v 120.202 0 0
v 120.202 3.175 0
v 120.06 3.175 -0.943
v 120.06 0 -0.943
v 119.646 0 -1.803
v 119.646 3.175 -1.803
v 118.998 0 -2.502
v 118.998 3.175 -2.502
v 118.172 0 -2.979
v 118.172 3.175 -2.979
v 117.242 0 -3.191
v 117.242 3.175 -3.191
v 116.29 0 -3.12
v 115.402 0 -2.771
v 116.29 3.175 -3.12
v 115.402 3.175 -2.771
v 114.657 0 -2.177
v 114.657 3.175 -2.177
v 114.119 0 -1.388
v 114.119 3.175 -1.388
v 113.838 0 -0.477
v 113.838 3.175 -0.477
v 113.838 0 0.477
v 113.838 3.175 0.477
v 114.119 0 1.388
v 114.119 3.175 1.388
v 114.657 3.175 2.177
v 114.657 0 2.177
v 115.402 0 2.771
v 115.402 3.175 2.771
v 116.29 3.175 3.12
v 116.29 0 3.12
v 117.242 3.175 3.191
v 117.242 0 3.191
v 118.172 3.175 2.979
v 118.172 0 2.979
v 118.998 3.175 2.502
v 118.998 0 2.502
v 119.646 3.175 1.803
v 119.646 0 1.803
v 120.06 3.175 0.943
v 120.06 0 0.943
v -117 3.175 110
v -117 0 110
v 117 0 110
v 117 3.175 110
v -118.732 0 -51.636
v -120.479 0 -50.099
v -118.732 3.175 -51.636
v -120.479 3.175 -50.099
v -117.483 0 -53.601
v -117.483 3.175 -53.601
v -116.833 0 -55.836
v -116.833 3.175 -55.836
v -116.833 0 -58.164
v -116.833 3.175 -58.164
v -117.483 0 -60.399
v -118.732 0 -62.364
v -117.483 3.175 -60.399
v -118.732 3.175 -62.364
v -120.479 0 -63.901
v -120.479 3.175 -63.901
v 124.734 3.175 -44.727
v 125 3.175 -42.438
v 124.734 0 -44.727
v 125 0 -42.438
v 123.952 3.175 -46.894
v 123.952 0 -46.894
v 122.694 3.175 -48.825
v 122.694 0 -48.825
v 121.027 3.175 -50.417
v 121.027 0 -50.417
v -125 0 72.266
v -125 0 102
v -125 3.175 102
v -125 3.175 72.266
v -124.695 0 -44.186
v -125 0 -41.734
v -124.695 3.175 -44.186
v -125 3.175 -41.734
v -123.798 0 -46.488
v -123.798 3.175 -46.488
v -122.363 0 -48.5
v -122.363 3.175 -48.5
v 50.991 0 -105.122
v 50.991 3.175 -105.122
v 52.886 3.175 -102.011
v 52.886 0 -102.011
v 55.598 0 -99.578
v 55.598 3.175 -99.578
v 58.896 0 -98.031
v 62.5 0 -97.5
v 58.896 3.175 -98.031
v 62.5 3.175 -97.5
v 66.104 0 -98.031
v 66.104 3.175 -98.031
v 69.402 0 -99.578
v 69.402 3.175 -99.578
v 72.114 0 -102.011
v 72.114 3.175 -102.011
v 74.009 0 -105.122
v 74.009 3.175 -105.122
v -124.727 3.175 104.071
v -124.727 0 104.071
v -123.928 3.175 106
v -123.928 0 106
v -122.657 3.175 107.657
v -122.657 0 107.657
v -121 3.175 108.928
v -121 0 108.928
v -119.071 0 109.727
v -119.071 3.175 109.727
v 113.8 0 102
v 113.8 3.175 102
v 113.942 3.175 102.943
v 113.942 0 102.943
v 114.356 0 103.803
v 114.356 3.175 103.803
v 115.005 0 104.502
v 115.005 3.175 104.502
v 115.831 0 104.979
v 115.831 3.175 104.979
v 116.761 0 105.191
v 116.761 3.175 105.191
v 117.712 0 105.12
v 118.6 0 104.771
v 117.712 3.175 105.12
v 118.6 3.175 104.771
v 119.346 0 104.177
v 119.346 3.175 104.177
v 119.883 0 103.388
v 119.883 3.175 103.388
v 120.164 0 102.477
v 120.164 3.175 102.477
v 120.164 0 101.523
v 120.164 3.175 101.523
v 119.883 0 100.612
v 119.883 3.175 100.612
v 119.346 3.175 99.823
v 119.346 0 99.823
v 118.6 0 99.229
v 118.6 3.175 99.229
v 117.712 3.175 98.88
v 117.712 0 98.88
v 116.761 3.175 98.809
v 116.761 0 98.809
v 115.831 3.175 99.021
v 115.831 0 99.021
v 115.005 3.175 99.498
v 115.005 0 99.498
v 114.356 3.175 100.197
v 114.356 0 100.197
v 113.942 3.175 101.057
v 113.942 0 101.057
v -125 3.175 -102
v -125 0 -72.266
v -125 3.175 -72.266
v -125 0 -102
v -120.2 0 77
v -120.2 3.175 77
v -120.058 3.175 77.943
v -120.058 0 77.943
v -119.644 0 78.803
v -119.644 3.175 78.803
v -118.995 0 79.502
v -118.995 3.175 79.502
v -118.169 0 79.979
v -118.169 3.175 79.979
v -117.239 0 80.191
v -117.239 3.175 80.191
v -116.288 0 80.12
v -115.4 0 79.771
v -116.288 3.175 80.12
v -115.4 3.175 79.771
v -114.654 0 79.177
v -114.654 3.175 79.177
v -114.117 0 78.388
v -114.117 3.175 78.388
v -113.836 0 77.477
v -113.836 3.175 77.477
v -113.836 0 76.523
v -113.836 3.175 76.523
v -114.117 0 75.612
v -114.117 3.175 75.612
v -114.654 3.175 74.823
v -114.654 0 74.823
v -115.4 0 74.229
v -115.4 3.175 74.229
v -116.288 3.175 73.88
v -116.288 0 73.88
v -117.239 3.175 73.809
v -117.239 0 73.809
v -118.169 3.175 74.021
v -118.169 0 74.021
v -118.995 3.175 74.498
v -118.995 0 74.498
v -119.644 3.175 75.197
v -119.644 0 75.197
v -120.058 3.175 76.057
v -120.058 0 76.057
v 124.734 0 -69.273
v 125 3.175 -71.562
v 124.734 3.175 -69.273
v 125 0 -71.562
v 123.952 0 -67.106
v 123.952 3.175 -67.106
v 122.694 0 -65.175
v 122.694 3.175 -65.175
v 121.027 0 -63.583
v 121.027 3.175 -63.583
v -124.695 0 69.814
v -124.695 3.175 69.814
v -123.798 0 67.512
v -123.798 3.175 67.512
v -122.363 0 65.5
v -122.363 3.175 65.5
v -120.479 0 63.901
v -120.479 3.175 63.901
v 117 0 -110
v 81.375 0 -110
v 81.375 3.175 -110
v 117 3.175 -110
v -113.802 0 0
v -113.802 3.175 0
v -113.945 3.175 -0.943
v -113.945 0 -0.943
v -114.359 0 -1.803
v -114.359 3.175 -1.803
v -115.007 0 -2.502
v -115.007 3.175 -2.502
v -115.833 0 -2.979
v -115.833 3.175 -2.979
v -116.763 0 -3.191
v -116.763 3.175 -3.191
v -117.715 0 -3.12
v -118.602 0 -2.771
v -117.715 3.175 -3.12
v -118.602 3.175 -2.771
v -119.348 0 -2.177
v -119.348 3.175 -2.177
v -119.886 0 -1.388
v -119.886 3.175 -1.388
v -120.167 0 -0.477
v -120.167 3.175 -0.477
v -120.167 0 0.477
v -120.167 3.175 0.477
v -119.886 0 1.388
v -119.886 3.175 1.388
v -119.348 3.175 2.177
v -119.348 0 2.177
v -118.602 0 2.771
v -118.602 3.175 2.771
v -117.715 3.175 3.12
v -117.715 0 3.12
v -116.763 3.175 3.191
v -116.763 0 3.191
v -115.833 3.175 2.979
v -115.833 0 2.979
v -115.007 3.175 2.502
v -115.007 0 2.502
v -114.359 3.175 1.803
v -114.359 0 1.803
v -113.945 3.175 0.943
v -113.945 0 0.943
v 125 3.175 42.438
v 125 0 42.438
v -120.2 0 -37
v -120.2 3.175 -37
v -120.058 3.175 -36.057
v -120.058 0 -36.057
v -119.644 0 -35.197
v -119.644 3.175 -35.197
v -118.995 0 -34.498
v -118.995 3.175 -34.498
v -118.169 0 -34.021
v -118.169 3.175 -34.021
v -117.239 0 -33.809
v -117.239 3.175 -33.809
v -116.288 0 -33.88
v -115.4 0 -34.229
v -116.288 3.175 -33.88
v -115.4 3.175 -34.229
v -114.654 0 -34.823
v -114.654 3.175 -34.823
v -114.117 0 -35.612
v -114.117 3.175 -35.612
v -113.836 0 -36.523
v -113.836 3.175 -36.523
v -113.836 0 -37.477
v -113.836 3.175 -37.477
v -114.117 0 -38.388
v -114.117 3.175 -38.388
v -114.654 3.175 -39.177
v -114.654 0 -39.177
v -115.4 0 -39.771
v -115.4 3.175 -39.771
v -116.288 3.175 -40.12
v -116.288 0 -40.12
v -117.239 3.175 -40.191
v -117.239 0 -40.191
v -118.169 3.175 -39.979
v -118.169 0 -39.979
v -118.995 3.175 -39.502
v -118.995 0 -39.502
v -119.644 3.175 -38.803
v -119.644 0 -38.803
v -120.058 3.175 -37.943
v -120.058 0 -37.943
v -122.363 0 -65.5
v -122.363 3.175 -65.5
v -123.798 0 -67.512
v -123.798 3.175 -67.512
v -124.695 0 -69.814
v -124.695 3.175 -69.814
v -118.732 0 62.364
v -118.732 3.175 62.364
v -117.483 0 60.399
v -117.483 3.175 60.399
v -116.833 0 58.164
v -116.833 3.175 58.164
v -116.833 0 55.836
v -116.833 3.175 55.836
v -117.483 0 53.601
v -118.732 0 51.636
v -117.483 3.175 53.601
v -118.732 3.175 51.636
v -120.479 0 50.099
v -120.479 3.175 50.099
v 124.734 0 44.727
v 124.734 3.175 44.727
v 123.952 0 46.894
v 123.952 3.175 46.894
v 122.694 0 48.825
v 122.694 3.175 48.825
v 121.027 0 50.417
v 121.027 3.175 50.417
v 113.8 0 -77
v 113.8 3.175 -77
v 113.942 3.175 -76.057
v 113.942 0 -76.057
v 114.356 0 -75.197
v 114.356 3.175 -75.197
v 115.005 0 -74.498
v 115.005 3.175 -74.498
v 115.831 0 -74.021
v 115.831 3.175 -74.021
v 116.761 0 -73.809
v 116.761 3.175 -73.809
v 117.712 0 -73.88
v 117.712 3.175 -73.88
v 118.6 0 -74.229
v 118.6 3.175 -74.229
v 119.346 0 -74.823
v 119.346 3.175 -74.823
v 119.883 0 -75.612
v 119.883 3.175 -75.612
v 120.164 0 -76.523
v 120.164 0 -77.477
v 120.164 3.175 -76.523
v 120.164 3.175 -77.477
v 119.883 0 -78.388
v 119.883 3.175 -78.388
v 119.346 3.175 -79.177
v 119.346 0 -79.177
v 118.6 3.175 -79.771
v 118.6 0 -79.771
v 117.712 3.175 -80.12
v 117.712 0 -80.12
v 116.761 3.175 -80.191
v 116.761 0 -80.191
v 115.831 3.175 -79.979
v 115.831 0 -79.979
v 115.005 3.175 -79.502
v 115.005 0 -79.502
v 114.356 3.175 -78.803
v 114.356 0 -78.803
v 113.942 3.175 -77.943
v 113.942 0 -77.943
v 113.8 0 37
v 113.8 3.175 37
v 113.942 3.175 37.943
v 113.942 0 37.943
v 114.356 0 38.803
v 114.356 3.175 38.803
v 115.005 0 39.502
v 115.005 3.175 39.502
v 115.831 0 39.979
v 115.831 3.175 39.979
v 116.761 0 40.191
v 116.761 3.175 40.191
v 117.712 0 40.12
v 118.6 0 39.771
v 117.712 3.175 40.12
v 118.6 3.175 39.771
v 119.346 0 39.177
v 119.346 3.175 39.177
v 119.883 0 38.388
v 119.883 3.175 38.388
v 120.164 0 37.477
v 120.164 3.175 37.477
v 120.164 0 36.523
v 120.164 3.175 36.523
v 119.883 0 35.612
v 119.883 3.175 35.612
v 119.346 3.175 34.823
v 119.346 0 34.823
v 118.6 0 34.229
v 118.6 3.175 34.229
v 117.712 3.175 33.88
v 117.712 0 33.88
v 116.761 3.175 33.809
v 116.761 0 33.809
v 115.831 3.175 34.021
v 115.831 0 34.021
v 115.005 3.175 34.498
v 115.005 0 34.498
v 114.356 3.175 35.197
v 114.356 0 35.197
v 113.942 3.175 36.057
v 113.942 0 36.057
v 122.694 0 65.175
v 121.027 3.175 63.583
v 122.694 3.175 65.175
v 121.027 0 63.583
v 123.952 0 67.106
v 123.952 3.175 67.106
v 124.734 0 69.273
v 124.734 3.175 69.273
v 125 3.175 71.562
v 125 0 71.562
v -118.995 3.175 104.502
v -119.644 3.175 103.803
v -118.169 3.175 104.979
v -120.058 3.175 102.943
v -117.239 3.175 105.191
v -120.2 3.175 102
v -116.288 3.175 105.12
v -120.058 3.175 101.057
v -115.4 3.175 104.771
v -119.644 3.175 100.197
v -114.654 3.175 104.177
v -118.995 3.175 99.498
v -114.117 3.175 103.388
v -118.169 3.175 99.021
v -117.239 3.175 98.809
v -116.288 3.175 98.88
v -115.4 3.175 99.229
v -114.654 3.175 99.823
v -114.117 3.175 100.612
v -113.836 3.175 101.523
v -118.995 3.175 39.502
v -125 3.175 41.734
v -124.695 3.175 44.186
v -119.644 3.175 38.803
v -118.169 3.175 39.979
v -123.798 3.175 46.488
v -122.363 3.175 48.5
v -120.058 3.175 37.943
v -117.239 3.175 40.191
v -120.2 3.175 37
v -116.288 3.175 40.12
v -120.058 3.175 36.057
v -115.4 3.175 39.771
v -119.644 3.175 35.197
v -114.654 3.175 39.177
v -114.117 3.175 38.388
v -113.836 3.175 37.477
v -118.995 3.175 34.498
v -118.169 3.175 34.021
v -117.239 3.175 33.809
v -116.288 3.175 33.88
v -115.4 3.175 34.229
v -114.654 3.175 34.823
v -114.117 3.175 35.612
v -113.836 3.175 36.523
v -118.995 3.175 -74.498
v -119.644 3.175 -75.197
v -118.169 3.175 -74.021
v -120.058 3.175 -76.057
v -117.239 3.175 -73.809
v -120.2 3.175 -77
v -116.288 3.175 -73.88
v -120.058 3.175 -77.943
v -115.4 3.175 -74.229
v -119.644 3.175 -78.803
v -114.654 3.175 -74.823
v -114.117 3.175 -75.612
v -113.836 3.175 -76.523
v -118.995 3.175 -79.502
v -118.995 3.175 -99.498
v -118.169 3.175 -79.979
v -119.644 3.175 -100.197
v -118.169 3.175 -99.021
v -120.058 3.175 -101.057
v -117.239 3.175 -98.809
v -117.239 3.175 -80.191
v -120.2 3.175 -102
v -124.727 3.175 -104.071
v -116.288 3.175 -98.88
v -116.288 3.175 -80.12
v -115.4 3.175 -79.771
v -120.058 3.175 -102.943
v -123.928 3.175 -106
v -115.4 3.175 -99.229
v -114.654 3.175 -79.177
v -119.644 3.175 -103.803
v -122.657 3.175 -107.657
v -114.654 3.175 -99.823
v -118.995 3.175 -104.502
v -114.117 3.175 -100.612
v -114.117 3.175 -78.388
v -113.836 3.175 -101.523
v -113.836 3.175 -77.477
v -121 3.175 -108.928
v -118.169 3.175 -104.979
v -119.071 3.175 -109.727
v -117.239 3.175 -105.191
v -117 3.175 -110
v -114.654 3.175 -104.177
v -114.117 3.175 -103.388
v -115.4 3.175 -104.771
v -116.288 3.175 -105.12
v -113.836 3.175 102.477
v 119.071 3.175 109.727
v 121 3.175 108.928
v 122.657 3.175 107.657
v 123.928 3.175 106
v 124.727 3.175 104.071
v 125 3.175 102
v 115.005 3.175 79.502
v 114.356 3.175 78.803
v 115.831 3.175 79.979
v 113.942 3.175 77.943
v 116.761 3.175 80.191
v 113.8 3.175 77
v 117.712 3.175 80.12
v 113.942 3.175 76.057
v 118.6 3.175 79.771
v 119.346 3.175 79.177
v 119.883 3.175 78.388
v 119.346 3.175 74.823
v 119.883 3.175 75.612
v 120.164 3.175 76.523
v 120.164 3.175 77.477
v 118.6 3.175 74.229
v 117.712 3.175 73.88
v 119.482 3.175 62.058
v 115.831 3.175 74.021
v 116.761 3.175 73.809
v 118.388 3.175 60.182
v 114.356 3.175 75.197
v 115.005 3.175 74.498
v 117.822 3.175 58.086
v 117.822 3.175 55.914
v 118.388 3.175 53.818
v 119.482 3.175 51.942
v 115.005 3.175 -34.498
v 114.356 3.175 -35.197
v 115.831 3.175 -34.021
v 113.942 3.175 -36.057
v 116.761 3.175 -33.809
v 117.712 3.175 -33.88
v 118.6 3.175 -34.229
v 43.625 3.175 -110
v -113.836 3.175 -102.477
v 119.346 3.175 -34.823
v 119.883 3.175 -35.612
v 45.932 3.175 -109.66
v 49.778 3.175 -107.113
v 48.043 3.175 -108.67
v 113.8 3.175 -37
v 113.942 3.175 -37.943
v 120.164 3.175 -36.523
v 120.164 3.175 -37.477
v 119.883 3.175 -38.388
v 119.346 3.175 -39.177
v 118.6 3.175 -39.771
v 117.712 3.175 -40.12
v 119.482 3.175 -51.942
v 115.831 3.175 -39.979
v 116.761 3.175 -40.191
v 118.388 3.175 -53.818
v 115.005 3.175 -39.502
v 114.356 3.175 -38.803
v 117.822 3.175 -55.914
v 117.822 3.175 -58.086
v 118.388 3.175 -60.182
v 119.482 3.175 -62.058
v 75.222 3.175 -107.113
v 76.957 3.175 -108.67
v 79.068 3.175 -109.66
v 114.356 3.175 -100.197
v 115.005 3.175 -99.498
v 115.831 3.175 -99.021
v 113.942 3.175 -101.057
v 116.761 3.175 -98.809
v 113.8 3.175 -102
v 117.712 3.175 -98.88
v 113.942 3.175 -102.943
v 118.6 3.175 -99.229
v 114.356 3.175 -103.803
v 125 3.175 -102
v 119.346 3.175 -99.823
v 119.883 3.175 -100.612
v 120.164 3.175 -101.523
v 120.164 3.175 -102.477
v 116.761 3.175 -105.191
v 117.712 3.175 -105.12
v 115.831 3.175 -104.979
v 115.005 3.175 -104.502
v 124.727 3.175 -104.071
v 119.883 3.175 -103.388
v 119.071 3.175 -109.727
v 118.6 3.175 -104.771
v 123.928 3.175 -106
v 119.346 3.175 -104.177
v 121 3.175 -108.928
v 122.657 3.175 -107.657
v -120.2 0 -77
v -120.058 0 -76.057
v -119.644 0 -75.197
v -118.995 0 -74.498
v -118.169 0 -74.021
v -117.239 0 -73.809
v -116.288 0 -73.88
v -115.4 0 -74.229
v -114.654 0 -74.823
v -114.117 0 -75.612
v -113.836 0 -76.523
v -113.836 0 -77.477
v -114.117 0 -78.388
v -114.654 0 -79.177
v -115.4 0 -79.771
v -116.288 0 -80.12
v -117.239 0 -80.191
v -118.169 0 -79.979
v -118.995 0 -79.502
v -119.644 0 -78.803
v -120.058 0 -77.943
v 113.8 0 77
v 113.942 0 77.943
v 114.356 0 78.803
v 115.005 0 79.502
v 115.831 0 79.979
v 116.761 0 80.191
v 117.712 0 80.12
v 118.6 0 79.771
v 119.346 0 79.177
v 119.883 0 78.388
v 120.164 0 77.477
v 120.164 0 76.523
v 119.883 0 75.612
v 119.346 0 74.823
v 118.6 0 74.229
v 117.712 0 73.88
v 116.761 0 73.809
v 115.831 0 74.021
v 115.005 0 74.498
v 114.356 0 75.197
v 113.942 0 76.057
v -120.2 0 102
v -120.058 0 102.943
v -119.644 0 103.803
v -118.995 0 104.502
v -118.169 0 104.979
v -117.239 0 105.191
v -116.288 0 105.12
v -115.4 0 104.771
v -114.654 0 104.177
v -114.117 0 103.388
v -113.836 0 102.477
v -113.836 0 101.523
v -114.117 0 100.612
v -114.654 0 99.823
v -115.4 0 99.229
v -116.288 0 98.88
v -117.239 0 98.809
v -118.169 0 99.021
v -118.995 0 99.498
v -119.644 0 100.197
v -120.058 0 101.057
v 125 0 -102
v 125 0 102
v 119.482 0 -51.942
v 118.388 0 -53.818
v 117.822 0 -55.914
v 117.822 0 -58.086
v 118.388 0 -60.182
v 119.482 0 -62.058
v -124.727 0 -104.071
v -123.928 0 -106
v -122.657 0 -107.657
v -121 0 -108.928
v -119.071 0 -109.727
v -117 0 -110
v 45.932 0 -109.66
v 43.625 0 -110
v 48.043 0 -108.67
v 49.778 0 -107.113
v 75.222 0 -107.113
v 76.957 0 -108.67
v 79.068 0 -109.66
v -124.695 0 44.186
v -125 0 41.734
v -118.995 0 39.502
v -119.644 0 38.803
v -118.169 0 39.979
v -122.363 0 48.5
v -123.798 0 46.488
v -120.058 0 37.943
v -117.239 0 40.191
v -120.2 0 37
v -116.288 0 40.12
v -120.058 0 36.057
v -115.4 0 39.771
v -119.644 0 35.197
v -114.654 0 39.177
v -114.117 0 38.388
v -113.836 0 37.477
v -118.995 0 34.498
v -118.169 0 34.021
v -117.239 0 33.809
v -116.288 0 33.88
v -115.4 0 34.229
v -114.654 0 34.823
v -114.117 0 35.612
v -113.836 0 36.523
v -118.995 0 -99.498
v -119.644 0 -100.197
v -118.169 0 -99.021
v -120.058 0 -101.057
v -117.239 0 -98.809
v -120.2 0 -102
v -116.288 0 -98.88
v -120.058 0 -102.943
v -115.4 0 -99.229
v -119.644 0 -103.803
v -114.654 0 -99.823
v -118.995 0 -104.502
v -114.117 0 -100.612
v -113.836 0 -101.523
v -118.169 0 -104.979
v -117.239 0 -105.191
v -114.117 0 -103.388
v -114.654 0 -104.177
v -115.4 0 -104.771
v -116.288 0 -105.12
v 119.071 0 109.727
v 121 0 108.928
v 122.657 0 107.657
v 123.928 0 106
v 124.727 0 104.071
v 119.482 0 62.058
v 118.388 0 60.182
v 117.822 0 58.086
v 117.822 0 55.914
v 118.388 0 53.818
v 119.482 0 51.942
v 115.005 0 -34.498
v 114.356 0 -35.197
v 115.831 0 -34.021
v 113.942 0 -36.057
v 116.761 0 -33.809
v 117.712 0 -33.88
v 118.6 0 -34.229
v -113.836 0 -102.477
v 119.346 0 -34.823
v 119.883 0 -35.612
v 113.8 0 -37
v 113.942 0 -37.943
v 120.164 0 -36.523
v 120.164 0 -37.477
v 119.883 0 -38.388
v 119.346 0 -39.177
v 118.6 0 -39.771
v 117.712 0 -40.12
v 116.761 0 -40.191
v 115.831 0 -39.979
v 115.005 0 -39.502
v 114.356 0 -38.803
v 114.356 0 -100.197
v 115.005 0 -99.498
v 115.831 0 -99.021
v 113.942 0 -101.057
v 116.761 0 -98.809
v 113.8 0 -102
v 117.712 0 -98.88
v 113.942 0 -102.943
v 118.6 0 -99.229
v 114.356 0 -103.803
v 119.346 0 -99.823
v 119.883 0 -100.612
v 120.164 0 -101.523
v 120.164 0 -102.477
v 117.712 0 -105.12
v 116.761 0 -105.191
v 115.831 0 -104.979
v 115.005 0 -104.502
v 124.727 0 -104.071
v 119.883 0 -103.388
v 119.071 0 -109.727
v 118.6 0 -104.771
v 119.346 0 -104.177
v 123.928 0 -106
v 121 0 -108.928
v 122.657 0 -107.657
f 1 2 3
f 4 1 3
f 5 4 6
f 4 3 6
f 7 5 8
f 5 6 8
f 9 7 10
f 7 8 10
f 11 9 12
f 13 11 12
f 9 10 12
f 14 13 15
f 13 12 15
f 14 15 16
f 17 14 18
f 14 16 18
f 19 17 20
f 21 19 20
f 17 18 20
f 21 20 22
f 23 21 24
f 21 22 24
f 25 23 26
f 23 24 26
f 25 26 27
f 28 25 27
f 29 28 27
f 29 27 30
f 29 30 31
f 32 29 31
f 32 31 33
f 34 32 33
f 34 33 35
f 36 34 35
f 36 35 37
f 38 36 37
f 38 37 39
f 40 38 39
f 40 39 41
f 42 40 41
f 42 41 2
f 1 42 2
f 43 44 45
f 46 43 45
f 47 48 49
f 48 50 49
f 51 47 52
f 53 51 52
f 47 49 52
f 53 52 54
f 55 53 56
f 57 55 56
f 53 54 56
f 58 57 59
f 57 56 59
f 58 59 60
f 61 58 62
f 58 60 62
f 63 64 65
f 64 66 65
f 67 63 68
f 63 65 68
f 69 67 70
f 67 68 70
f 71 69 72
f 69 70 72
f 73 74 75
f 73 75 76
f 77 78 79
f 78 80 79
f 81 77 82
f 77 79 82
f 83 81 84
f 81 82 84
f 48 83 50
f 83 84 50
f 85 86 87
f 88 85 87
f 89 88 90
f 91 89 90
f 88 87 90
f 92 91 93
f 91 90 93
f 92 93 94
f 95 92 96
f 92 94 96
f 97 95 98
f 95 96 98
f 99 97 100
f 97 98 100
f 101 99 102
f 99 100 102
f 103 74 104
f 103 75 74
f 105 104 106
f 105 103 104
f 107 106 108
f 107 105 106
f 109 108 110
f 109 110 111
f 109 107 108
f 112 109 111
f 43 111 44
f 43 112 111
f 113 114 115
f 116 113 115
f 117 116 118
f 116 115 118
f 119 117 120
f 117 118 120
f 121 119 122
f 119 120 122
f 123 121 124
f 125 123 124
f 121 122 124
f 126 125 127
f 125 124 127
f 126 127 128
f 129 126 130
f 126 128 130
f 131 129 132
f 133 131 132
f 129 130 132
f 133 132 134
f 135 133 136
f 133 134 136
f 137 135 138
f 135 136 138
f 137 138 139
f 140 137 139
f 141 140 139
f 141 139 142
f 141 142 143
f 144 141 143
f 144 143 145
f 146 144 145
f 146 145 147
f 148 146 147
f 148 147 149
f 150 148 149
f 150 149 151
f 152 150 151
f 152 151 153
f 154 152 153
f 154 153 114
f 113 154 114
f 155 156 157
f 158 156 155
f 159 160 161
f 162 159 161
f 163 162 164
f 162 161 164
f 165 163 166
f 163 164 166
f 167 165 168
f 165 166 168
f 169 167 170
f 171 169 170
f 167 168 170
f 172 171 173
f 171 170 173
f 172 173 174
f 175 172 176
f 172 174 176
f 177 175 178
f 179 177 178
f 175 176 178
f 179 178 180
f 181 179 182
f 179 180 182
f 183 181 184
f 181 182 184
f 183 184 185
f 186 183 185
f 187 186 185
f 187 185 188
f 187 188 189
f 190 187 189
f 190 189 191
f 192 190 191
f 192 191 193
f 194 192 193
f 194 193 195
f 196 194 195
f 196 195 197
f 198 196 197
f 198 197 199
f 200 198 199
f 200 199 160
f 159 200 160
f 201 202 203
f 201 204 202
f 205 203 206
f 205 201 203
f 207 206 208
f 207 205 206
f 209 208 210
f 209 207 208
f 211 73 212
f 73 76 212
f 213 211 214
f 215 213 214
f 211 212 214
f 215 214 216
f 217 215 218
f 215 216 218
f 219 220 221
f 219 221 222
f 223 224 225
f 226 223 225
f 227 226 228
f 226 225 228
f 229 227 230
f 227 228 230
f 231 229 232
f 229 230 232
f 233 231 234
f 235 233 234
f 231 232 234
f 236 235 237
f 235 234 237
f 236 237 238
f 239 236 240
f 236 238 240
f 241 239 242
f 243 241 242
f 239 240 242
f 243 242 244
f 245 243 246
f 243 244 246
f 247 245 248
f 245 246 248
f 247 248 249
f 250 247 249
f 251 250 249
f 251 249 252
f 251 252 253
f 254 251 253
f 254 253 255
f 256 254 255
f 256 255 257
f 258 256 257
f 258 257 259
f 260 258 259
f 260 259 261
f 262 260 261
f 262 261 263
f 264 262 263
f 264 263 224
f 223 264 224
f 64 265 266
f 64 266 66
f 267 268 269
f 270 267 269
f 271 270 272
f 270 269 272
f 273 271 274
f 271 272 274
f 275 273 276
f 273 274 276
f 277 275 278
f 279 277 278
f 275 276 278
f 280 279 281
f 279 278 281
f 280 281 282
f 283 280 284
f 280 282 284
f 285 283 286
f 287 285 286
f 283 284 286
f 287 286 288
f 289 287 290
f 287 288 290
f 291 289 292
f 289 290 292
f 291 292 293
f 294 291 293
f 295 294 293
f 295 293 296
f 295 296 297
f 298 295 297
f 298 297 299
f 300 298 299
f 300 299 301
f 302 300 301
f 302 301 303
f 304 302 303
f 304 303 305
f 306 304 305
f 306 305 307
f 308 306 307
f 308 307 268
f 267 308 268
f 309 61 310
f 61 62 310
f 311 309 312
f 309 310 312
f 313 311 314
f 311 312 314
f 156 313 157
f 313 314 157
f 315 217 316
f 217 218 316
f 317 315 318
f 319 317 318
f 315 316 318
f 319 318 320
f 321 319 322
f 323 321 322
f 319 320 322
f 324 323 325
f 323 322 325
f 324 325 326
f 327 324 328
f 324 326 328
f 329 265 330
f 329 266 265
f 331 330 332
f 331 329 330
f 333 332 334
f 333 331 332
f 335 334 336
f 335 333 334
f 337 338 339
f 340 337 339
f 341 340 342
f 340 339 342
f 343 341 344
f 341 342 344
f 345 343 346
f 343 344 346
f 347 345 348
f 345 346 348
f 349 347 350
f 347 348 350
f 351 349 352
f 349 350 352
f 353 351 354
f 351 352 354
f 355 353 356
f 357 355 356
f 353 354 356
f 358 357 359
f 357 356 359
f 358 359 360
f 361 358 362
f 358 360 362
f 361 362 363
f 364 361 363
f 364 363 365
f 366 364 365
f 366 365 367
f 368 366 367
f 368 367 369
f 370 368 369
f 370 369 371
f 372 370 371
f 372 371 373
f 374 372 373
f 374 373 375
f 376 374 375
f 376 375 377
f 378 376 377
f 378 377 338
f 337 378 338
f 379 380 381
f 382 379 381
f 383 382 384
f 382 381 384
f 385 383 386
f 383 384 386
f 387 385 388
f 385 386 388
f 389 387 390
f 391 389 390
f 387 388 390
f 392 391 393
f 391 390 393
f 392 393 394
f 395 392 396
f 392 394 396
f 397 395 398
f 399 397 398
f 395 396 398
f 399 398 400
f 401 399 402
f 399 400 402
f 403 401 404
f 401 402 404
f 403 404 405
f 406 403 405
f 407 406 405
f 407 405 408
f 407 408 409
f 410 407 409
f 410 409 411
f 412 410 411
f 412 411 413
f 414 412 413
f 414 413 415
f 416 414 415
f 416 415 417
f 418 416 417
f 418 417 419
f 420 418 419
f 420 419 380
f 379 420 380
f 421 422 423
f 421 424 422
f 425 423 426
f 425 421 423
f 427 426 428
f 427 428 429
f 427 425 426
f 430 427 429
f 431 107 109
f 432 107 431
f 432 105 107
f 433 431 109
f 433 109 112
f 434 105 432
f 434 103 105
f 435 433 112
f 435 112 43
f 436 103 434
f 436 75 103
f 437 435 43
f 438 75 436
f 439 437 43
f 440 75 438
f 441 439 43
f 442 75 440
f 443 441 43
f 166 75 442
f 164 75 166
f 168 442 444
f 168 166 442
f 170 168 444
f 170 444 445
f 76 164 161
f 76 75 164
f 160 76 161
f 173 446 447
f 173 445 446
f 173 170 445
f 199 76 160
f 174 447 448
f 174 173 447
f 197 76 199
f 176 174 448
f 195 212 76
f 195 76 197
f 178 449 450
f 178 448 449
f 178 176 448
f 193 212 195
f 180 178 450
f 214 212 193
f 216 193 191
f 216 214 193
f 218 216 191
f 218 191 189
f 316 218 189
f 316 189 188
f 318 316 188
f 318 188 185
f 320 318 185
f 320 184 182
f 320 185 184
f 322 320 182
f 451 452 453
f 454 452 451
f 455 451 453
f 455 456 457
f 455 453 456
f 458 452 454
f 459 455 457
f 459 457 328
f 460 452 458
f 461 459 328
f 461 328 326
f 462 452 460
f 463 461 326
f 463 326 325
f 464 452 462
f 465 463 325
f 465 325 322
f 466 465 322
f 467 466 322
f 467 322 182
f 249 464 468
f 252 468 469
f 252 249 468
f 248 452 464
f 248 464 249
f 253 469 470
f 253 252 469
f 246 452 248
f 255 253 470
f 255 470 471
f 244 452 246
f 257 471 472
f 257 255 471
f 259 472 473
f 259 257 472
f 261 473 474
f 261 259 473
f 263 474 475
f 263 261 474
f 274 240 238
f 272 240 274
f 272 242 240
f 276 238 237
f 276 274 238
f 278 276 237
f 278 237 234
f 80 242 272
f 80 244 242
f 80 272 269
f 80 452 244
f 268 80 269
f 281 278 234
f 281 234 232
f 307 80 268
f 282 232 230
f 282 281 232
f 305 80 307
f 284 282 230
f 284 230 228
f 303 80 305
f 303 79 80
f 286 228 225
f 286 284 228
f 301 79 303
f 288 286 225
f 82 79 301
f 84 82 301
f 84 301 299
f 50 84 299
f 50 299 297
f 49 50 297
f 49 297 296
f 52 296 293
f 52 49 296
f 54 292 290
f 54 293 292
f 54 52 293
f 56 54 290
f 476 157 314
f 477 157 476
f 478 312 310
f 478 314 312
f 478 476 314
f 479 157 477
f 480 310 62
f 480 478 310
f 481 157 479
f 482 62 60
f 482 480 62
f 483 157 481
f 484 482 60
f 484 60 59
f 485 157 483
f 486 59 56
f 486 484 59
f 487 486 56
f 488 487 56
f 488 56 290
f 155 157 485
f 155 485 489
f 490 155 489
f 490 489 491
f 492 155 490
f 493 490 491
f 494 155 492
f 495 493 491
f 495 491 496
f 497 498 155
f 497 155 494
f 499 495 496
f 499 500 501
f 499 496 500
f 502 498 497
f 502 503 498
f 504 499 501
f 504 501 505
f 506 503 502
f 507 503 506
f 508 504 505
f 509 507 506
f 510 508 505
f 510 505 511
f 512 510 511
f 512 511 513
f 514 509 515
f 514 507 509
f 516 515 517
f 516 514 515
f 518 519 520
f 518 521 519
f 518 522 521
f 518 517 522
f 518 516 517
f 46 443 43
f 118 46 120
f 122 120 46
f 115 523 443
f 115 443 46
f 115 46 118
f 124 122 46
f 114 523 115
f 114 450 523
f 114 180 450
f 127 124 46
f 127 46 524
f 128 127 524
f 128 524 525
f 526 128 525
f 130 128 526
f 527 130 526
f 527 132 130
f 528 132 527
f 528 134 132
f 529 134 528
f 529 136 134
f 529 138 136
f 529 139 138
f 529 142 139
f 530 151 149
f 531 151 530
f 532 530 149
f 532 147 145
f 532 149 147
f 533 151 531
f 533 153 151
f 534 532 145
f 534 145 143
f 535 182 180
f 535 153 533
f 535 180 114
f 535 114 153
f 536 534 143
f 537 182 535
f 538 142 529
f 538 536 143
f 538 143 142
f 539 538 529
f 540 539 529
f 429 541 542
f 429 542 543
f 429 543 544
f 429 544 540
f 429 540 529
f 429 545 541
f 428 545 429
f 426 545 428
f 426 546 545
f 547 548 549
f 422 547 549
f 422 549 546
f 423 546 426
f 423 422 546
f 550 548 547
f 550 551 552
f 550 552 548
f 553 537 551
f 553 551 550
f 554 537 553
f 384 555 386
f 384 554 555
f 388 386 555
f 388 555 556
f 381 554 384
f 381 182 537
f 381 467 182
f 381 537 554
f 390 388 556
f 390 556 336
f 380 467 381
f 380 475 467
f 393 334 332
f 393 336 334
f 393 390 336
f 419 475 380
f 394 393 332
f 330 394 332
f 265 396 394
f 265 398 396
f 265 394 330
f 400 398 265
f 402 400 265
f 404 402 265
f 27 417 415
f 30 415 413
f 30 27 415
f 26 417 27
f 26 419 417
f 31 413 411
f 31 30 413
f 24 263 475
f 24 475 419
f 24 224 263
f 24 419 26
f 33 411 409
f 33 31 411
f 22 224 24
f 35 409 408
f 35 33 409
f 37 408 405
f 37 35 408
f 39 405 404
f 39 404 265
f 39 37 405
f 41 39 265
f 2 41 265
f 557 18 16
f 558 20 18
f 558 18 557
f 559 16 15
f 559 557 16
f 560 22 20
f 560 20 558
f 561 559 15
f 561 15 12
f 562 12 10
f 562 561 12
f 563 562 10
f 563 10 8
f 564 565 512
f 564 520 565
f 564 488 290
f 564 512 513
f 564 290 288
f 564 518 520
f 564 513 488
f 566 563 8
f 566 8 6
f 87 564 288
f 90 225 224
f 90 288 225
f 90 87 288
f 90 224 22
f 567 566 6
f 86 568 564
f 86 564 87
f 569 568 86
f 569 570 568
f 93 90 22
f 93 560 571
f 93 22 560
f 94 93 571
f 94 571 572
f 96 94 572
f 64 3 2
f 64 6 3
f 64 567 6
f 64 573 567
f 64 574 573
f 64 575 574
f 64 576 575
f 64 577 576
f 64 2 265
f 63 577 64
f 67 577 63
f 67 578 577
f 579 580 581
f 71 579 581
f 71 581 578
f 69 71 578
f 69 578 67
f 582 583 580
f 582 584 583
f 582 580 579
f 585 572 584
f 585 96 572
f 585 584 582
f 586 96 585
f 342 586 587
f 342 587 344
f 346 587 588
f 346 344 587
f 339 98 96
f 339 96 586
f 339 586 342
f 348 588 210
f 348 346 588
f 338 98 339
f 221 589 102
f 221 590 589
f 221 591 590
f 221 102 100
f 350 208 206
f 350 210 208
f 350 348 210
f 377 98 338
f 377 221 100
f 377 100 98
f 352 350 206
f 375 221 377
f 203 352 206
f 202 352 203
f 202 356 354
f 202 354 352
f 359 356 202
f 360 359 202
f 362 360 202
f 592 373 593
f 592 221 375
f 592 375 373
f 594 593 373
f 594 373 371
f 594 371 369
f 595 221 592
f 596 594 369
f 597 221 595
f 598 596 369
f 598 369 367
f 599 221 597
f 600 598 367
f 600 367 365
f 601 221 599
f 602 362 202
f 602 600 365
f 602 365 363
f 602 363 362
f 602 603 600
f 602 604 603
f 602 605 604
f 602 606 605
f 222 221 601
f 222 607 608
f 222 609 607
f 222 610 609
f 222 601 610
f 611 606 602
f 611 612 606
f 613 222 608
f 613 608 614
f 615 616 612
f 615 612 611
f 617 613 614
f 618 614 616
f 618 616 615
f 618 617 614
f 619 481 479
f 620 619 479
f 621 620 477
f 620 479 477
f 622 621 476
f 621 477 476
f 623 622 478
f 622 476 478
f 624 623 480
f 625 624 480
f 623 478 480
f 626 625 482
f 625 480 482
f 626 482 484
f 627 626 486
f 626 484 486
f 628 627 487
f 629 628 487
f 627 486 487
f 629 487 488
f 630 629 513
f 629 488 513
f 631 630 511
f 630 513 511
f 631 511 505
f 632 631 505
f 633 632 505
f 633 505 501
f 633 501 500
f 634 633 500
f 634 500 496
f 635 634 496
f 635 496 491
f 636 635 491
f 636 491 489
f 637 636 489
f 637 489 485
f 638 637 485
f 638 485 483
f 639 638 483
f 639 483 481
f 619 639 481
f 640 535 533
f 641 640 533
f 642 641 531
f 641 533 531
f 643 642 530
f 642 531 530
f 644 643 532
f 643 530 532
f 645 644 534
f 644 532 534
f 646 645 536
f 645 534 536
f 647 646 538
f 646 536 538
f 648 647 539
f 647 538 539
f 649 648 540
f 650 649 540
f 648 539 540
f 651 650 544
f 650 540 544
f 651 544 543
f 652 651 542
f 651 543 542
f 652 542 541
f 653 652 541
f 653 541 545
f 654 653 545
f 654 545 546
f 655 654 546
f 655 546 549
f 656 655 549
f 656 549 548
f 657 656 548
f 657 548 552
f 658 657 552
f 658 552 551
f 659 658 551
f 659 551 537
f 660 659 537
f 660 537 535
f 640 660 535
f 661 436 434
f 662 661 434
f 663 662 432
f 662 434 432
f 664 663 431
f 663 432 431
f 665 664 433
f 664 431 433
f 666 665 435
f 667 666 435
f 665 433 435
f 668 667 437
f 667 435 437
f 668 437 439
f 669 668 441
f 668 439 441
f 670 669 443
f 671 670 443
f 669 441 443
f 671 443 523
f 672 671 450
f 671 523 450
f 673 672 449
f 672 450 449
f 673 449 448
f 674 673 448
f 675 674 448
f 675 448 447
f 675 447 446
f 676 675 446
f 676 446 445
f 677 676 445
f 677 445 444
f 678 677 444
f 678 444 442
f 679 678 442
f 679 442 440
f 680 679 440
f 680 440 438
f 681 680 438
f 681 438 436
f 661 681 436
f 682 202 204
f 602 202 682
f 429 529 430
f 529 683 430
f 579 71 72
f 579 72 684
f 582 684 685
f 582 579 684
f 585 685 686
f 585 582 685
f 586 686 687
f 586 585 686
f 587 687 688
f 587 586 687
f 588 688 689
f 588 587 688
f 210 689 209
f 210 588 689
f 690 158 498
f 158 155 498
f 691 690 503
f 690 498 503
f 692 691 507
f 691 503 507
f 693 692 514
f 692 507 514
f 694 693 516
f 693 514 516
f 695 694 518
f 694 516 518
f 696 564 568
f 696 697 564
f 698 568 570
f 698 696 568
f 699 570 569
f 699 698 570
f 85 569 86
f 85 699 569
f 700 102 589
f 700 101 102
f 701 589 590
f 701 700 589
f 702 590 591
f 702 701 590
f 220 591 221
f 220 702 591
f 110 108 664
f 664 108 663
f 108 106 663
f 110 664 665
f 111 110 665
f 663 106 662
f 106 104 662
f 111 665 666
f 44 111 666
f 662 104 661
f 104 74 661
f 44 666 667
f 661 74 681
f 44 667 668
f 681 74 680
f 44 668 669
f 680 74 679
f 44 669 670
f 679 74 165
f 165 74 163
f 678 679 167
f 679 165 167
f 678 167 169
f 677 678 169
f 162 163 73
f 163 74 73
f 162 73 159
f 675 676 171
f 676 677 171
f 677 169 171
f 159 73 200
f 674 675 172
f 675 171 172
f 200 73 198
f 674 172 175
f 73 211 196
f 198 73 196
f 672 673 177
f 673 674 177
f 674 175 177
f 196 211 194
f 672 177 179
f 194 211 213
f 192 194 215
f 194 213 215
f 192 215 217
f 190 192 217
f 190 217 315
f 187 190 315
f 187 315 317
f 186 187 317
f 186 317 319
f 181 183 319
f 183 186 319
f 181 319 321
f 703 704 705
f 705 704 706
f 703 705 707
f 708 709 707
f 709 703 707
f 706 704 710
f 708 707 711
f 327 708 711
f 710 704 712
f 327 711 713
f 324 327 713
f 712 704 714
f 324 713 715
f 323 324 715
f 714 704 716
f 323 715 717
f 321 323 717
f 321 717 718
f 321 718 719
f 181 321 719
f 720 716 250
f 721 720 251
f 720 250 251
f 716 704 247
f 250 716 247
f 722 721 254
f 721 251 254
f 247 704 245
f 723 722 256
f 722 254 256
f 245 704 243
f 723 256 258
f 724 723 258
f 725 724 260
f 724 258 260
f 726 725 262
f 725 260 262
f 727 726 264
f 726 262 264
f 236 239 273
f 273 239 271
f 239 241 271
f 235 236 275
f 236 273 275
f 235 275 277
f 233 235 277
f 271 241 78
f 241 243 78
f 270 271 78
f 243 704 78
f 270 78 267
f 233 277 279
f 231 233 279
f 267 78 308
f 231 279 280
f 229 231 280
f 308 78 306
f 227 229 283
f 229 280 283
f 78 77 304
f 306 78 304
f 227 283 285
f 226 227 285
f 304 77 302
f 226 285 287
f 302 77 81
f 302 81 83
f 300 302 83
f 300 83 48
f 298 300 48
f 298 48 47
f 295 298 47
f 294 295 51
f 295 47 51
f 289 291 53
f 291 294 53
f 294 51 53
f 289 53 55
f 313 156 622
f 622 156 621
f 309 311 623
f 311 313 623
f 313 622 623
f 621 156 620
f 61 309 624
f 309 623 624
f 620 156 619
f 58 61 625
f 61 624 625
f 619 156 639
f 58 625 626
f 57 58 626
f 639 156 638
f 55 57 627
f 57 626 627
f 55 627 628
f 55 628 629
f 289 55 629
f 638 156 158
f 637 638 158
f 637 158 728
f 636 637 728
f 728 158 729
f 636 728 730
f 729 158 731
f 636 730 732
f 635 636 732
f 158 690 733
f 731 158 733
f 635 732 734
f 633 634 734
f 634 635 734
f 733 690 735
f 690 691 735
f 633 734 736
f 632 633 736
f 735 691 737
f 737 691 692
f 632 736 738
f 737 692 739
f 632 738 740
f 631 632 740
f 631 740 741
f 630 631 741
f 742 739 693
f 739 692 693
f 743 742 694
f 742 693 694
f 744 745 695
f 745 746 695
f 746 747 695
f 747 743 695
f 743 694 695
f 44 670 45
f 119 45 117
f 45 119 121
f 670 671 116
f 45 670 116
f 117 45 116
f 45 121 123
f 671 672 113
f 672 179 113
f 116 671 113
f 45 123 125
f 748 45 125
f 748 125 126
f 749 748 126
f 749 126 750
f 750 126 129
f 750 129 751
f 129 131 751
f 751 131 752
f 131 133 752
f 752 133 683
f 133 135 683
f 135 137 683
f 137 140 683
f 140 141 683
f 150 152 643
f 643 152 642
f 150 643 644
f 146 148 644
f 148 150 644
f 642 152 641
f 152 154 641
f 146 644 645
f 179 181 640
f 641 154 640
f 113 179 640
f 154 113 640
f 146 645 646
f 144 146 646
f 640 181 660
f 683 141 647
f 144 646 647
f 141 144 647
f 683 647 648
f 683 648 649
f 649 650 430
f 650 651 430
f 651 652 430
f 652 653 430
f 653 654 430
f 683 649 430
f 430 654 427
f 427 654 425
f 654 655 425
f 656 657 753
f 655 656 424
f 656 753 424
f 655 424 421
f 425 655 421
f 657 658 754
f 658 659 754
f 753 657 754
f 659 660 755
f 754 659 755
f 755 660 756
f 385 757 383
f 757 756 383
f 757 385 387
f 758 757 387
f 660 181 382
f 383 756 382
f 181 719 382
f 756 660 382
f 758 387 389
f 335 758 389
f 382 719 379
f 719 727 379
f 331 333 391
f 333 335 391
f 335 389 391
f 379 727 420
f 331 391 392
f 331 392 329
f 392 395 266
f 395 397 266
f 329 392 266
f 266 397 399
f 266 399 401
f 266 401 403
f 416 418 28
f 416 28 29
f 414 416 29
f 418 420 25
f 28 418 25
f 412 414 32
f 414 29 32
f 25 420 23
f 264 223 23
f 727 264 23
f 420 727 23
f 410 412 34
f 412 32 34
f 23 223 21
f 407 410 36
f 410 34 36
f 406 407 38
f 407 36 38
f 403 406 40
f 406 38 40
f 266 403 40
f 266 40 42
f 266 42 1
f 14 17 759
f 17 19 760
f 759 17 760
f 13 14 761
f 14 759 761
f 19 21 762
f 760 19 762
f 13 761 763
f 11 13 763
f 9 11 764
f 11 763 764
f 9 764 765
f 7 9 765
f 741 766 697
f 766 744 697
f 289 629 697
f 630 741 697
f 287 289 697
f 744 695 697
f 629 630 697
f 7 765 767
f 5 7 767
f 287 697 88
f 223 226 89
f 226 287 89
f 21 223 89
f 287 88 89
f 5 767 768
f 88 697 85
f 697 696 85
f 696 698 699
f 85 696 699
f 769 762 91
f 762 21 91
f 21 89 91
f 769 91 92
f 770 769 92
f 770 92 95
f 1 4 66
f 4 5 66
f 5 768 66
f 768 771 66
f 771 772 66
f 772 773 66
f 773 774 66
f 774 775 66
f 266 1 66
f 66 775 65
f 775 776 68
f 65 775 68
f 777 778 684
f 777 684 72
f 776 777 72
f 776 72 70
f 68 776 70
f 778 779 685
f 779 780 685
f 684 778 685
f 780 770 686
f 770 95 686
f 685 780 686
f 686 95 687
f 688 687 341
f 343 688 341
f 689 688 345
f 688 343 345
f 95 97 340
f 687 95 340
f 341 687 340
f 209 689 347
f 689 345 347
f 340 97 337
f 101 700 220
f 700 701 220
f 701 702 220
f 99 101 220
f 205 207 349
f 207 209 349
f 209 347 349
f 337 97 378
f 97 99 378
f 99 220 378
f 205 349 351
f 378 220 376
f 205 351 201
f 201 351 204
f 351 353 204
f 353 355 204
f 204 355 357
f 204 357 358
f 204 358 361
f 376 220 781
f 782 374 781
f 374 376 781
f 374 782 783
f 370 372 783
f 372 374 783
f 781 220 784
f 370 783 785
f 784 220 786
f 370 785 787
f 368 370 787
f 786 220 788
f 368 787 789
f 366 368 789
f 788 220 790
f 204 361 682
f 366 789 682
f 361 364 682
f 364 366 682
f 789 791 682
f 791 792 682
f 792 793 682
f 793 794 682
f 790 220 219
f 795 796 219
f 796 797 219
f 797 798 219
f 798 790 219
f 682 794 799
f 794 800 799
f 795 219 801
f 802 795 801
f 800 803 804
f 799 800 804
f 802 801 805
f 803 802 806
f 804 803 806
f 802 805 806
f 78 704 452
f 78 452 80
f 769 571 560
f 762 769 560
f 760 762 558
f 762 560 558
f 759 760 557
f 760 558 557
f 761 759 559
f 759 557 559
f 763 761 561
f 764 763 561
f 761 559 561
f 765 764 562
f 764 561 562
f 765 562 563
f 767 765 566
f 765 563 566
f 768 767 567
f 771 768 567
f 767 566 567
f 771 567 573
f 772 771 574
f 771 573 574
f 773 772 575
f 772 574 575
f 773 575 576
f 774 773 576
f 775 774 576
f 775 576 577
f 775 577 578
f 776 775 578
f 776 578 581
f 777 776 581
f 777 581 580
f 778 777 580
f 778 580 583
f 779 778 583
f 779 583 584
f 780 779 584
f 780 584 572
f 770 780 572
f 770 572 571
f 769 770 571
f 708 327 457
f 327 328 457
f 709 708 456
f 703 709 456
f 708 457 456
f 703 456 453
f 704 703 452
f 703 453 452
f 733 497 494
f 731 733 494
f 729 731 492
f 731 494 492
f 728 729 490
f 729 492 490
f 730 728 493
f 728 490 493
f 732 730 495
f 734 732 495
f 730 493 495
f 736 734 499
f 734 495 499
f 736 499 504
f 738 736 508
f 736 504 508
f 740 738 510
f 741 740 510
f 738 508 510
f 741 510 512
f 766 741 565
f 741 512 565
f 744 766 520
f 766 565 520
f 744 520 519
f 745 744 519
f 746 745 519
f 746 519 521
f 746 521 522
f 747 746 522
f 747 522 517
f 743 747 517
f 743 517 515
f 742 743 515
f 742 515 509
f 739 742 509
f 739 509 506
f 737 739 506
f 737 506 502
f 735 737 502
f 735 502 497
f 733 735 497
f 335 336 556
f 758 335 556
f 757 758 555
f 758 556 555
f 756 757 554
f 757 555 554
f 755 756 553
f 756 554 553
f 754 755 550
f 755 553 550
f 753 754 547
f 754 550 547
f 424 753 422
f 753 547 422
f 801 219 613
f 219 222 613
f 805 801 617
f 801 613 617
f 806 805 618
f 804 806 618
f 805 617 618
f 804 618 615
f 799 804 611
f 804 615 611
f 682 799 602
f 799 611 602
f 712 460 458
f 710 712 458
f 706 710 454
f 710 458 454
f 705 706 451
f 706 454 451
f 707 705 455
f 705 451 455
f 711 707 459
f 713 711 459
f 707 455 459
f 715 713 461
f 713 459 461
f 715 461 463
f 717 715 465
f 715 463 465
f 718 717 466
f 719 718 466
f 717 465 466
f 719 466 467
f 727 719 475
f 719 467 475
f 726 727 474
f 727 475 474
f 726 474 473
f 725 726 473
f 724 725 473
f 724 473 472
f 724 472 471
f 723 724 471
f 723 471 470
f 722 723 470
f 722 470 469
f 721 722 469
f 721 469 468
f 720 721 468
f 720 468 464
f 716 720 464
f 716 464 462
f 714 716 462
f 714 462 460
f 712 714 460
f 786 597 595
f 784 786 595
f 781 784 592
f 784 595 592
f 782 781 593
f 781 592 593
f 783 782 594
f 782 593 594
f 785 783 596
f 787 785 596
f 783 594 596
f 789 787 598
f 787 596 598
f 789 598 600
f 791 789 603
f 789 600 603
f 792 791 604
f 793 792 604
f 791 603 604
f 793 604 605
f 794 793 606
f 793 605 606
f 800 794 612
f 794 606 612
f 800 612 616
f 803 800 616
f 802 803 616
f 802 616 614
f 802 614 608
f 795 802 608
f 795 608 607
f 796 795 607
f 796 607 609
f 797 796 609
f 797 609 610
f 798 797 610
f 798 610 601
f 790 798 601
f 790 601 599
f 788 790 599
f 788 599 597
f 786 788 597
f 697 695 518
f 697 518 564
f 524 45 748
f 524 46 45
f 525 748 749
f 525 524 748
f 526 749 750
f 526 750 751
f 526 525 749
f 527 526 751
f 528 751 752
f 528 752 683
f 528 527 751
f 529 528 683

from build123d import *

# Parameters (mm, degrees)
SKETCH1_W           = 250
SKETCH1_H           = 220
BOSS_EXTRUDE1_DEPTH = 3.175
SKETCH2_R           = 3.2
CUT_EXTRUDE1_DEPTH  = 4.175
FILLET1_R           = 8
CUT_EXTRUDE3_DEPTH  = 4.175
FILLET3_R           = 8
SKETCH5_R           = 8.25
CUT_EXTRUDE4_DEPTH  = 4.175
FILLET4_R           = 10
FILLET5_R           = 8
BOSS_EXTRUDE2_DEPTH = 3.175
FILLET6_R           = 10
SKETCH7_R           = 3.2
CUT_EXTRUDE5_DEPTH  = 4.175


with BuildPart() as part:
    # Sketch1 → Boss-Extrude1 (new body)
    with BuildSketch(Plane(origin=(0, 0, 0), x_dir=(1, 0, 0), z_dir=(0, 1, 0))):
        Rectangle(SKETCH1_W, SKETCH1_H)
    extrude(amount=BOSS_EXTRUDE1_DEPTH)

    # Sketch2 → Cut-Extrude1 (cut, through all)
    with BuildSketch(Plane(origin=(0, 3.175, 0), x_dir=(-1, 0, 0), z_dir=(0, 1, 0))):
        with Locations((117, -102)):
            Circle(SKETCH2_R)
        with Locations((-117, -102)):
            Circle(SKETCH2_R)
        with Locations((-117, 102)):
            Circle(SKETCH2_R)
        with Locations((117, 102)):
            Circle(SKETCH2_R)
        with Locations((117, -77)):
            Circle(SKETCH2_R)
        with Locations((117, 77)):
            Circle(SKETCH2_R)
        with Locations((-117, 77)):
            Circle(SKETCH2_R)
        with Locations((-117, -77)):
            Circle(SKETCH2_R)
        with Locations((117, 37)):
            Circle(SKETCH2_R)
        with Locations((117, -37)):
            Circle(SKETCH2_R)
        with Locations((-117, -37)):
            Circle(SKETCH2_R)
        with Locations((-117, 37)):
            Circle(SKETCH2_R)
    extrude(amount=-CUT_EXTRUDE1_DEPTH, mode=Mode.SUBTRACT)

    # Fillet1
    fillet1_edges = [part.edges().sort_by_distance(p)[0] for p in [
        (-125, 1.5875, -110),
        (125, 1.5875, -110),
        (125, 1.5875, 110),
        (-125, 1.5875, 110),
    ]]
    fillet(fillet1_edges, radius=FILLET1_R)

    # Sketch4 → Cut-Extrude3 (cut, through all)
    with BuildSketch(Plane(origin=(0, 3.175, 0), x_dir=(1, 0, 0), z_dir=(0, 1, 0))):
        with BuildLine():
            Line((75, 110), (50, 110))
            ThreePointArc((50, 110), (62.5, 97.5), (75, 110))
        make_face()
    extrude(amount=-CUT_EXTRUDE3_DEPTH, mode=Mode.SUBTRACT)

    # Fillet3
    fillet3_edges = [part.edges().sort_by_distance(p)[0] for p in [
        (75, 1.5875, -110),
        (50, 1.5875, -110),
    ]]
    fillet(fillet3_edges, radius=FILLET3_R)

    # Sketch5 → Cut-Extrude4 (cut, through all)
    with BuildSketch(Plane(origin=(0, 3.175, 0), x_dir=(1, 0, 0), z_dir=(0, 1, 0))):
        with Locations((-125, 57)):
            Circle(SKETCH5_R)
        with Locations((-125, -57)):
            Circle(SKETCH5_R)
        with BuildLine():
            Line((108.641149162, 70.240746381), (117.711258049, 53.135192013))
            ThreePointArc((117.711258049, 53.135192013), (132.069199597, 52.746893247), (125, 65.25))
            Line((125, 65.25), (125, 77.296464556))
            ThreePointArc((125, 77.296464556), (120.427492424, 70.453223368), (112.355339059, 72.058874503))
            Line((112.355339059, 72.058874503), (111.82233047, 72.591883092))
            ThreePointArc((111.82233047, 72.591883092), (109.219390768, 72.786063189), (108.641149162, 70.240746381))
        make_face()
        with BuildLine():
            Line((112.355339059, -72.058874503), (111.82233047, -72.591883092))
            ThreePointArc((111.82233047, -72.591883092), (109.219390768, -72.786063189), (108.641149162, -70.240746381))
            Line((108.641149162, -70.240746381), (117.711258049, -53.135192013))
            ThreePointArc((117.711258049, -53.135192013), (132.069199597, -52.746893247), (125, -65.25))
            Line((125, -65.25), (125, -77.296464556))
            ThreePointArc((125, -77.296464556), (120.427492424, -70.453223368), (112.355339059, -72.058874503))
        make_face()
    extrude(amount=-CUT_EXTRUDE4_DEPTH, mode=Mode.SUBTRACT)

    # Fillet4
    fillet4_edges = [part.edges().sort_by_distance(p)[0] for p in [
        (-125, 1.5875, -65.25),
        (-125, 1.5875, -48.75),
        (-125, 1.5875, 48.75),
        (-125, 1.5875, 65.25),
    ]]
    fillet(fillet4_edges, radius=FILLET4_R)

    # Fillet5
    fillet5_edges = [part.edges().sort_by_distance(p)[0] for p in [
        (125, 1.5875, -48.75),
        (125, 1.5875, 48.75),
    ]]
    fillet(fillet5_edges, radius=FILLET5_R)

    # Sketch6 → Boss-Extrude2 (add)
    with BuildSketch(Plane(origin=(0, 3.175, 0), x_dir=(1, 0, 0), z_dir=(0, 1, 0))):
        with BuildLine():
            Line((125, 65.189169677), (125, 77.296464556))
            Line((125, 77.296464556), (116.645162041, 73.27854658))
            Line((116.645162041, 73.27854658), (108.408116908, 79.390702383))
            Line((108.408116908, 79.390702383), (108.408116908, 56.119015219))
            Line((108.408116908, 56.119015219), (125, 42.85565484))
            Line((125, 42.85565484), (125, 48.810830323))
            ThreePointArc((125, 48.810830323), (117.75, 57), (125, 65.189169677))
        make_face()
        with BuildLine():
            Line((125, -42.85565484), (125, -48.810830323))
            ThreePointArc((125, -48.810830323), (117.75, -57), (125, -65.189169677))
            Line((125, -65.189169677), (125, -77.296464556))
            Line((125, -77.296464556), (116.645162041, -73.27854658))
            Line((116.645162041, -73.27854658), (108.408116908, -79.390702383))
            Line((108.408116908, -79.390702383), (108.408116908, -56.119015219))
            Line((108.408116908, -56.119015219), (125, -42.85565484))
        make_face()
    extrude(amount=-BOSS_EXTRUDE2_DEPTH)

    # Fillet6
    fillet6_edges = [part.edges().sort_by_distance(p)[0] for p in [
        (125, 1.5875, -65.189169677),
        (125, 1.5875, -48.810830323),
        (125, 1.5875, 48.810830323),
        (125, 1.5875, 65.189169677),
    ]]
    fillet(fillet6_edges, radius=FILLET6_R)

    # Sketch7 → Cut-Extrude5 (cut, through all)
    with BuildSketch(Plane(origin=(0, 3.175, 0), x_dir=(1, 0, 0), z_dir=(0, 1, 0))):
        with Locations((117.002495653, 0)):
            Circle(SKETCH7_R)
        with Locations((-117.002495653, 0)):
            Circle(SKETCH7_R)
    extrude(amount=-CUT_EXTRUDE5_DEPTH, mode=Mode.SUBTRACT)


solid = part.part
